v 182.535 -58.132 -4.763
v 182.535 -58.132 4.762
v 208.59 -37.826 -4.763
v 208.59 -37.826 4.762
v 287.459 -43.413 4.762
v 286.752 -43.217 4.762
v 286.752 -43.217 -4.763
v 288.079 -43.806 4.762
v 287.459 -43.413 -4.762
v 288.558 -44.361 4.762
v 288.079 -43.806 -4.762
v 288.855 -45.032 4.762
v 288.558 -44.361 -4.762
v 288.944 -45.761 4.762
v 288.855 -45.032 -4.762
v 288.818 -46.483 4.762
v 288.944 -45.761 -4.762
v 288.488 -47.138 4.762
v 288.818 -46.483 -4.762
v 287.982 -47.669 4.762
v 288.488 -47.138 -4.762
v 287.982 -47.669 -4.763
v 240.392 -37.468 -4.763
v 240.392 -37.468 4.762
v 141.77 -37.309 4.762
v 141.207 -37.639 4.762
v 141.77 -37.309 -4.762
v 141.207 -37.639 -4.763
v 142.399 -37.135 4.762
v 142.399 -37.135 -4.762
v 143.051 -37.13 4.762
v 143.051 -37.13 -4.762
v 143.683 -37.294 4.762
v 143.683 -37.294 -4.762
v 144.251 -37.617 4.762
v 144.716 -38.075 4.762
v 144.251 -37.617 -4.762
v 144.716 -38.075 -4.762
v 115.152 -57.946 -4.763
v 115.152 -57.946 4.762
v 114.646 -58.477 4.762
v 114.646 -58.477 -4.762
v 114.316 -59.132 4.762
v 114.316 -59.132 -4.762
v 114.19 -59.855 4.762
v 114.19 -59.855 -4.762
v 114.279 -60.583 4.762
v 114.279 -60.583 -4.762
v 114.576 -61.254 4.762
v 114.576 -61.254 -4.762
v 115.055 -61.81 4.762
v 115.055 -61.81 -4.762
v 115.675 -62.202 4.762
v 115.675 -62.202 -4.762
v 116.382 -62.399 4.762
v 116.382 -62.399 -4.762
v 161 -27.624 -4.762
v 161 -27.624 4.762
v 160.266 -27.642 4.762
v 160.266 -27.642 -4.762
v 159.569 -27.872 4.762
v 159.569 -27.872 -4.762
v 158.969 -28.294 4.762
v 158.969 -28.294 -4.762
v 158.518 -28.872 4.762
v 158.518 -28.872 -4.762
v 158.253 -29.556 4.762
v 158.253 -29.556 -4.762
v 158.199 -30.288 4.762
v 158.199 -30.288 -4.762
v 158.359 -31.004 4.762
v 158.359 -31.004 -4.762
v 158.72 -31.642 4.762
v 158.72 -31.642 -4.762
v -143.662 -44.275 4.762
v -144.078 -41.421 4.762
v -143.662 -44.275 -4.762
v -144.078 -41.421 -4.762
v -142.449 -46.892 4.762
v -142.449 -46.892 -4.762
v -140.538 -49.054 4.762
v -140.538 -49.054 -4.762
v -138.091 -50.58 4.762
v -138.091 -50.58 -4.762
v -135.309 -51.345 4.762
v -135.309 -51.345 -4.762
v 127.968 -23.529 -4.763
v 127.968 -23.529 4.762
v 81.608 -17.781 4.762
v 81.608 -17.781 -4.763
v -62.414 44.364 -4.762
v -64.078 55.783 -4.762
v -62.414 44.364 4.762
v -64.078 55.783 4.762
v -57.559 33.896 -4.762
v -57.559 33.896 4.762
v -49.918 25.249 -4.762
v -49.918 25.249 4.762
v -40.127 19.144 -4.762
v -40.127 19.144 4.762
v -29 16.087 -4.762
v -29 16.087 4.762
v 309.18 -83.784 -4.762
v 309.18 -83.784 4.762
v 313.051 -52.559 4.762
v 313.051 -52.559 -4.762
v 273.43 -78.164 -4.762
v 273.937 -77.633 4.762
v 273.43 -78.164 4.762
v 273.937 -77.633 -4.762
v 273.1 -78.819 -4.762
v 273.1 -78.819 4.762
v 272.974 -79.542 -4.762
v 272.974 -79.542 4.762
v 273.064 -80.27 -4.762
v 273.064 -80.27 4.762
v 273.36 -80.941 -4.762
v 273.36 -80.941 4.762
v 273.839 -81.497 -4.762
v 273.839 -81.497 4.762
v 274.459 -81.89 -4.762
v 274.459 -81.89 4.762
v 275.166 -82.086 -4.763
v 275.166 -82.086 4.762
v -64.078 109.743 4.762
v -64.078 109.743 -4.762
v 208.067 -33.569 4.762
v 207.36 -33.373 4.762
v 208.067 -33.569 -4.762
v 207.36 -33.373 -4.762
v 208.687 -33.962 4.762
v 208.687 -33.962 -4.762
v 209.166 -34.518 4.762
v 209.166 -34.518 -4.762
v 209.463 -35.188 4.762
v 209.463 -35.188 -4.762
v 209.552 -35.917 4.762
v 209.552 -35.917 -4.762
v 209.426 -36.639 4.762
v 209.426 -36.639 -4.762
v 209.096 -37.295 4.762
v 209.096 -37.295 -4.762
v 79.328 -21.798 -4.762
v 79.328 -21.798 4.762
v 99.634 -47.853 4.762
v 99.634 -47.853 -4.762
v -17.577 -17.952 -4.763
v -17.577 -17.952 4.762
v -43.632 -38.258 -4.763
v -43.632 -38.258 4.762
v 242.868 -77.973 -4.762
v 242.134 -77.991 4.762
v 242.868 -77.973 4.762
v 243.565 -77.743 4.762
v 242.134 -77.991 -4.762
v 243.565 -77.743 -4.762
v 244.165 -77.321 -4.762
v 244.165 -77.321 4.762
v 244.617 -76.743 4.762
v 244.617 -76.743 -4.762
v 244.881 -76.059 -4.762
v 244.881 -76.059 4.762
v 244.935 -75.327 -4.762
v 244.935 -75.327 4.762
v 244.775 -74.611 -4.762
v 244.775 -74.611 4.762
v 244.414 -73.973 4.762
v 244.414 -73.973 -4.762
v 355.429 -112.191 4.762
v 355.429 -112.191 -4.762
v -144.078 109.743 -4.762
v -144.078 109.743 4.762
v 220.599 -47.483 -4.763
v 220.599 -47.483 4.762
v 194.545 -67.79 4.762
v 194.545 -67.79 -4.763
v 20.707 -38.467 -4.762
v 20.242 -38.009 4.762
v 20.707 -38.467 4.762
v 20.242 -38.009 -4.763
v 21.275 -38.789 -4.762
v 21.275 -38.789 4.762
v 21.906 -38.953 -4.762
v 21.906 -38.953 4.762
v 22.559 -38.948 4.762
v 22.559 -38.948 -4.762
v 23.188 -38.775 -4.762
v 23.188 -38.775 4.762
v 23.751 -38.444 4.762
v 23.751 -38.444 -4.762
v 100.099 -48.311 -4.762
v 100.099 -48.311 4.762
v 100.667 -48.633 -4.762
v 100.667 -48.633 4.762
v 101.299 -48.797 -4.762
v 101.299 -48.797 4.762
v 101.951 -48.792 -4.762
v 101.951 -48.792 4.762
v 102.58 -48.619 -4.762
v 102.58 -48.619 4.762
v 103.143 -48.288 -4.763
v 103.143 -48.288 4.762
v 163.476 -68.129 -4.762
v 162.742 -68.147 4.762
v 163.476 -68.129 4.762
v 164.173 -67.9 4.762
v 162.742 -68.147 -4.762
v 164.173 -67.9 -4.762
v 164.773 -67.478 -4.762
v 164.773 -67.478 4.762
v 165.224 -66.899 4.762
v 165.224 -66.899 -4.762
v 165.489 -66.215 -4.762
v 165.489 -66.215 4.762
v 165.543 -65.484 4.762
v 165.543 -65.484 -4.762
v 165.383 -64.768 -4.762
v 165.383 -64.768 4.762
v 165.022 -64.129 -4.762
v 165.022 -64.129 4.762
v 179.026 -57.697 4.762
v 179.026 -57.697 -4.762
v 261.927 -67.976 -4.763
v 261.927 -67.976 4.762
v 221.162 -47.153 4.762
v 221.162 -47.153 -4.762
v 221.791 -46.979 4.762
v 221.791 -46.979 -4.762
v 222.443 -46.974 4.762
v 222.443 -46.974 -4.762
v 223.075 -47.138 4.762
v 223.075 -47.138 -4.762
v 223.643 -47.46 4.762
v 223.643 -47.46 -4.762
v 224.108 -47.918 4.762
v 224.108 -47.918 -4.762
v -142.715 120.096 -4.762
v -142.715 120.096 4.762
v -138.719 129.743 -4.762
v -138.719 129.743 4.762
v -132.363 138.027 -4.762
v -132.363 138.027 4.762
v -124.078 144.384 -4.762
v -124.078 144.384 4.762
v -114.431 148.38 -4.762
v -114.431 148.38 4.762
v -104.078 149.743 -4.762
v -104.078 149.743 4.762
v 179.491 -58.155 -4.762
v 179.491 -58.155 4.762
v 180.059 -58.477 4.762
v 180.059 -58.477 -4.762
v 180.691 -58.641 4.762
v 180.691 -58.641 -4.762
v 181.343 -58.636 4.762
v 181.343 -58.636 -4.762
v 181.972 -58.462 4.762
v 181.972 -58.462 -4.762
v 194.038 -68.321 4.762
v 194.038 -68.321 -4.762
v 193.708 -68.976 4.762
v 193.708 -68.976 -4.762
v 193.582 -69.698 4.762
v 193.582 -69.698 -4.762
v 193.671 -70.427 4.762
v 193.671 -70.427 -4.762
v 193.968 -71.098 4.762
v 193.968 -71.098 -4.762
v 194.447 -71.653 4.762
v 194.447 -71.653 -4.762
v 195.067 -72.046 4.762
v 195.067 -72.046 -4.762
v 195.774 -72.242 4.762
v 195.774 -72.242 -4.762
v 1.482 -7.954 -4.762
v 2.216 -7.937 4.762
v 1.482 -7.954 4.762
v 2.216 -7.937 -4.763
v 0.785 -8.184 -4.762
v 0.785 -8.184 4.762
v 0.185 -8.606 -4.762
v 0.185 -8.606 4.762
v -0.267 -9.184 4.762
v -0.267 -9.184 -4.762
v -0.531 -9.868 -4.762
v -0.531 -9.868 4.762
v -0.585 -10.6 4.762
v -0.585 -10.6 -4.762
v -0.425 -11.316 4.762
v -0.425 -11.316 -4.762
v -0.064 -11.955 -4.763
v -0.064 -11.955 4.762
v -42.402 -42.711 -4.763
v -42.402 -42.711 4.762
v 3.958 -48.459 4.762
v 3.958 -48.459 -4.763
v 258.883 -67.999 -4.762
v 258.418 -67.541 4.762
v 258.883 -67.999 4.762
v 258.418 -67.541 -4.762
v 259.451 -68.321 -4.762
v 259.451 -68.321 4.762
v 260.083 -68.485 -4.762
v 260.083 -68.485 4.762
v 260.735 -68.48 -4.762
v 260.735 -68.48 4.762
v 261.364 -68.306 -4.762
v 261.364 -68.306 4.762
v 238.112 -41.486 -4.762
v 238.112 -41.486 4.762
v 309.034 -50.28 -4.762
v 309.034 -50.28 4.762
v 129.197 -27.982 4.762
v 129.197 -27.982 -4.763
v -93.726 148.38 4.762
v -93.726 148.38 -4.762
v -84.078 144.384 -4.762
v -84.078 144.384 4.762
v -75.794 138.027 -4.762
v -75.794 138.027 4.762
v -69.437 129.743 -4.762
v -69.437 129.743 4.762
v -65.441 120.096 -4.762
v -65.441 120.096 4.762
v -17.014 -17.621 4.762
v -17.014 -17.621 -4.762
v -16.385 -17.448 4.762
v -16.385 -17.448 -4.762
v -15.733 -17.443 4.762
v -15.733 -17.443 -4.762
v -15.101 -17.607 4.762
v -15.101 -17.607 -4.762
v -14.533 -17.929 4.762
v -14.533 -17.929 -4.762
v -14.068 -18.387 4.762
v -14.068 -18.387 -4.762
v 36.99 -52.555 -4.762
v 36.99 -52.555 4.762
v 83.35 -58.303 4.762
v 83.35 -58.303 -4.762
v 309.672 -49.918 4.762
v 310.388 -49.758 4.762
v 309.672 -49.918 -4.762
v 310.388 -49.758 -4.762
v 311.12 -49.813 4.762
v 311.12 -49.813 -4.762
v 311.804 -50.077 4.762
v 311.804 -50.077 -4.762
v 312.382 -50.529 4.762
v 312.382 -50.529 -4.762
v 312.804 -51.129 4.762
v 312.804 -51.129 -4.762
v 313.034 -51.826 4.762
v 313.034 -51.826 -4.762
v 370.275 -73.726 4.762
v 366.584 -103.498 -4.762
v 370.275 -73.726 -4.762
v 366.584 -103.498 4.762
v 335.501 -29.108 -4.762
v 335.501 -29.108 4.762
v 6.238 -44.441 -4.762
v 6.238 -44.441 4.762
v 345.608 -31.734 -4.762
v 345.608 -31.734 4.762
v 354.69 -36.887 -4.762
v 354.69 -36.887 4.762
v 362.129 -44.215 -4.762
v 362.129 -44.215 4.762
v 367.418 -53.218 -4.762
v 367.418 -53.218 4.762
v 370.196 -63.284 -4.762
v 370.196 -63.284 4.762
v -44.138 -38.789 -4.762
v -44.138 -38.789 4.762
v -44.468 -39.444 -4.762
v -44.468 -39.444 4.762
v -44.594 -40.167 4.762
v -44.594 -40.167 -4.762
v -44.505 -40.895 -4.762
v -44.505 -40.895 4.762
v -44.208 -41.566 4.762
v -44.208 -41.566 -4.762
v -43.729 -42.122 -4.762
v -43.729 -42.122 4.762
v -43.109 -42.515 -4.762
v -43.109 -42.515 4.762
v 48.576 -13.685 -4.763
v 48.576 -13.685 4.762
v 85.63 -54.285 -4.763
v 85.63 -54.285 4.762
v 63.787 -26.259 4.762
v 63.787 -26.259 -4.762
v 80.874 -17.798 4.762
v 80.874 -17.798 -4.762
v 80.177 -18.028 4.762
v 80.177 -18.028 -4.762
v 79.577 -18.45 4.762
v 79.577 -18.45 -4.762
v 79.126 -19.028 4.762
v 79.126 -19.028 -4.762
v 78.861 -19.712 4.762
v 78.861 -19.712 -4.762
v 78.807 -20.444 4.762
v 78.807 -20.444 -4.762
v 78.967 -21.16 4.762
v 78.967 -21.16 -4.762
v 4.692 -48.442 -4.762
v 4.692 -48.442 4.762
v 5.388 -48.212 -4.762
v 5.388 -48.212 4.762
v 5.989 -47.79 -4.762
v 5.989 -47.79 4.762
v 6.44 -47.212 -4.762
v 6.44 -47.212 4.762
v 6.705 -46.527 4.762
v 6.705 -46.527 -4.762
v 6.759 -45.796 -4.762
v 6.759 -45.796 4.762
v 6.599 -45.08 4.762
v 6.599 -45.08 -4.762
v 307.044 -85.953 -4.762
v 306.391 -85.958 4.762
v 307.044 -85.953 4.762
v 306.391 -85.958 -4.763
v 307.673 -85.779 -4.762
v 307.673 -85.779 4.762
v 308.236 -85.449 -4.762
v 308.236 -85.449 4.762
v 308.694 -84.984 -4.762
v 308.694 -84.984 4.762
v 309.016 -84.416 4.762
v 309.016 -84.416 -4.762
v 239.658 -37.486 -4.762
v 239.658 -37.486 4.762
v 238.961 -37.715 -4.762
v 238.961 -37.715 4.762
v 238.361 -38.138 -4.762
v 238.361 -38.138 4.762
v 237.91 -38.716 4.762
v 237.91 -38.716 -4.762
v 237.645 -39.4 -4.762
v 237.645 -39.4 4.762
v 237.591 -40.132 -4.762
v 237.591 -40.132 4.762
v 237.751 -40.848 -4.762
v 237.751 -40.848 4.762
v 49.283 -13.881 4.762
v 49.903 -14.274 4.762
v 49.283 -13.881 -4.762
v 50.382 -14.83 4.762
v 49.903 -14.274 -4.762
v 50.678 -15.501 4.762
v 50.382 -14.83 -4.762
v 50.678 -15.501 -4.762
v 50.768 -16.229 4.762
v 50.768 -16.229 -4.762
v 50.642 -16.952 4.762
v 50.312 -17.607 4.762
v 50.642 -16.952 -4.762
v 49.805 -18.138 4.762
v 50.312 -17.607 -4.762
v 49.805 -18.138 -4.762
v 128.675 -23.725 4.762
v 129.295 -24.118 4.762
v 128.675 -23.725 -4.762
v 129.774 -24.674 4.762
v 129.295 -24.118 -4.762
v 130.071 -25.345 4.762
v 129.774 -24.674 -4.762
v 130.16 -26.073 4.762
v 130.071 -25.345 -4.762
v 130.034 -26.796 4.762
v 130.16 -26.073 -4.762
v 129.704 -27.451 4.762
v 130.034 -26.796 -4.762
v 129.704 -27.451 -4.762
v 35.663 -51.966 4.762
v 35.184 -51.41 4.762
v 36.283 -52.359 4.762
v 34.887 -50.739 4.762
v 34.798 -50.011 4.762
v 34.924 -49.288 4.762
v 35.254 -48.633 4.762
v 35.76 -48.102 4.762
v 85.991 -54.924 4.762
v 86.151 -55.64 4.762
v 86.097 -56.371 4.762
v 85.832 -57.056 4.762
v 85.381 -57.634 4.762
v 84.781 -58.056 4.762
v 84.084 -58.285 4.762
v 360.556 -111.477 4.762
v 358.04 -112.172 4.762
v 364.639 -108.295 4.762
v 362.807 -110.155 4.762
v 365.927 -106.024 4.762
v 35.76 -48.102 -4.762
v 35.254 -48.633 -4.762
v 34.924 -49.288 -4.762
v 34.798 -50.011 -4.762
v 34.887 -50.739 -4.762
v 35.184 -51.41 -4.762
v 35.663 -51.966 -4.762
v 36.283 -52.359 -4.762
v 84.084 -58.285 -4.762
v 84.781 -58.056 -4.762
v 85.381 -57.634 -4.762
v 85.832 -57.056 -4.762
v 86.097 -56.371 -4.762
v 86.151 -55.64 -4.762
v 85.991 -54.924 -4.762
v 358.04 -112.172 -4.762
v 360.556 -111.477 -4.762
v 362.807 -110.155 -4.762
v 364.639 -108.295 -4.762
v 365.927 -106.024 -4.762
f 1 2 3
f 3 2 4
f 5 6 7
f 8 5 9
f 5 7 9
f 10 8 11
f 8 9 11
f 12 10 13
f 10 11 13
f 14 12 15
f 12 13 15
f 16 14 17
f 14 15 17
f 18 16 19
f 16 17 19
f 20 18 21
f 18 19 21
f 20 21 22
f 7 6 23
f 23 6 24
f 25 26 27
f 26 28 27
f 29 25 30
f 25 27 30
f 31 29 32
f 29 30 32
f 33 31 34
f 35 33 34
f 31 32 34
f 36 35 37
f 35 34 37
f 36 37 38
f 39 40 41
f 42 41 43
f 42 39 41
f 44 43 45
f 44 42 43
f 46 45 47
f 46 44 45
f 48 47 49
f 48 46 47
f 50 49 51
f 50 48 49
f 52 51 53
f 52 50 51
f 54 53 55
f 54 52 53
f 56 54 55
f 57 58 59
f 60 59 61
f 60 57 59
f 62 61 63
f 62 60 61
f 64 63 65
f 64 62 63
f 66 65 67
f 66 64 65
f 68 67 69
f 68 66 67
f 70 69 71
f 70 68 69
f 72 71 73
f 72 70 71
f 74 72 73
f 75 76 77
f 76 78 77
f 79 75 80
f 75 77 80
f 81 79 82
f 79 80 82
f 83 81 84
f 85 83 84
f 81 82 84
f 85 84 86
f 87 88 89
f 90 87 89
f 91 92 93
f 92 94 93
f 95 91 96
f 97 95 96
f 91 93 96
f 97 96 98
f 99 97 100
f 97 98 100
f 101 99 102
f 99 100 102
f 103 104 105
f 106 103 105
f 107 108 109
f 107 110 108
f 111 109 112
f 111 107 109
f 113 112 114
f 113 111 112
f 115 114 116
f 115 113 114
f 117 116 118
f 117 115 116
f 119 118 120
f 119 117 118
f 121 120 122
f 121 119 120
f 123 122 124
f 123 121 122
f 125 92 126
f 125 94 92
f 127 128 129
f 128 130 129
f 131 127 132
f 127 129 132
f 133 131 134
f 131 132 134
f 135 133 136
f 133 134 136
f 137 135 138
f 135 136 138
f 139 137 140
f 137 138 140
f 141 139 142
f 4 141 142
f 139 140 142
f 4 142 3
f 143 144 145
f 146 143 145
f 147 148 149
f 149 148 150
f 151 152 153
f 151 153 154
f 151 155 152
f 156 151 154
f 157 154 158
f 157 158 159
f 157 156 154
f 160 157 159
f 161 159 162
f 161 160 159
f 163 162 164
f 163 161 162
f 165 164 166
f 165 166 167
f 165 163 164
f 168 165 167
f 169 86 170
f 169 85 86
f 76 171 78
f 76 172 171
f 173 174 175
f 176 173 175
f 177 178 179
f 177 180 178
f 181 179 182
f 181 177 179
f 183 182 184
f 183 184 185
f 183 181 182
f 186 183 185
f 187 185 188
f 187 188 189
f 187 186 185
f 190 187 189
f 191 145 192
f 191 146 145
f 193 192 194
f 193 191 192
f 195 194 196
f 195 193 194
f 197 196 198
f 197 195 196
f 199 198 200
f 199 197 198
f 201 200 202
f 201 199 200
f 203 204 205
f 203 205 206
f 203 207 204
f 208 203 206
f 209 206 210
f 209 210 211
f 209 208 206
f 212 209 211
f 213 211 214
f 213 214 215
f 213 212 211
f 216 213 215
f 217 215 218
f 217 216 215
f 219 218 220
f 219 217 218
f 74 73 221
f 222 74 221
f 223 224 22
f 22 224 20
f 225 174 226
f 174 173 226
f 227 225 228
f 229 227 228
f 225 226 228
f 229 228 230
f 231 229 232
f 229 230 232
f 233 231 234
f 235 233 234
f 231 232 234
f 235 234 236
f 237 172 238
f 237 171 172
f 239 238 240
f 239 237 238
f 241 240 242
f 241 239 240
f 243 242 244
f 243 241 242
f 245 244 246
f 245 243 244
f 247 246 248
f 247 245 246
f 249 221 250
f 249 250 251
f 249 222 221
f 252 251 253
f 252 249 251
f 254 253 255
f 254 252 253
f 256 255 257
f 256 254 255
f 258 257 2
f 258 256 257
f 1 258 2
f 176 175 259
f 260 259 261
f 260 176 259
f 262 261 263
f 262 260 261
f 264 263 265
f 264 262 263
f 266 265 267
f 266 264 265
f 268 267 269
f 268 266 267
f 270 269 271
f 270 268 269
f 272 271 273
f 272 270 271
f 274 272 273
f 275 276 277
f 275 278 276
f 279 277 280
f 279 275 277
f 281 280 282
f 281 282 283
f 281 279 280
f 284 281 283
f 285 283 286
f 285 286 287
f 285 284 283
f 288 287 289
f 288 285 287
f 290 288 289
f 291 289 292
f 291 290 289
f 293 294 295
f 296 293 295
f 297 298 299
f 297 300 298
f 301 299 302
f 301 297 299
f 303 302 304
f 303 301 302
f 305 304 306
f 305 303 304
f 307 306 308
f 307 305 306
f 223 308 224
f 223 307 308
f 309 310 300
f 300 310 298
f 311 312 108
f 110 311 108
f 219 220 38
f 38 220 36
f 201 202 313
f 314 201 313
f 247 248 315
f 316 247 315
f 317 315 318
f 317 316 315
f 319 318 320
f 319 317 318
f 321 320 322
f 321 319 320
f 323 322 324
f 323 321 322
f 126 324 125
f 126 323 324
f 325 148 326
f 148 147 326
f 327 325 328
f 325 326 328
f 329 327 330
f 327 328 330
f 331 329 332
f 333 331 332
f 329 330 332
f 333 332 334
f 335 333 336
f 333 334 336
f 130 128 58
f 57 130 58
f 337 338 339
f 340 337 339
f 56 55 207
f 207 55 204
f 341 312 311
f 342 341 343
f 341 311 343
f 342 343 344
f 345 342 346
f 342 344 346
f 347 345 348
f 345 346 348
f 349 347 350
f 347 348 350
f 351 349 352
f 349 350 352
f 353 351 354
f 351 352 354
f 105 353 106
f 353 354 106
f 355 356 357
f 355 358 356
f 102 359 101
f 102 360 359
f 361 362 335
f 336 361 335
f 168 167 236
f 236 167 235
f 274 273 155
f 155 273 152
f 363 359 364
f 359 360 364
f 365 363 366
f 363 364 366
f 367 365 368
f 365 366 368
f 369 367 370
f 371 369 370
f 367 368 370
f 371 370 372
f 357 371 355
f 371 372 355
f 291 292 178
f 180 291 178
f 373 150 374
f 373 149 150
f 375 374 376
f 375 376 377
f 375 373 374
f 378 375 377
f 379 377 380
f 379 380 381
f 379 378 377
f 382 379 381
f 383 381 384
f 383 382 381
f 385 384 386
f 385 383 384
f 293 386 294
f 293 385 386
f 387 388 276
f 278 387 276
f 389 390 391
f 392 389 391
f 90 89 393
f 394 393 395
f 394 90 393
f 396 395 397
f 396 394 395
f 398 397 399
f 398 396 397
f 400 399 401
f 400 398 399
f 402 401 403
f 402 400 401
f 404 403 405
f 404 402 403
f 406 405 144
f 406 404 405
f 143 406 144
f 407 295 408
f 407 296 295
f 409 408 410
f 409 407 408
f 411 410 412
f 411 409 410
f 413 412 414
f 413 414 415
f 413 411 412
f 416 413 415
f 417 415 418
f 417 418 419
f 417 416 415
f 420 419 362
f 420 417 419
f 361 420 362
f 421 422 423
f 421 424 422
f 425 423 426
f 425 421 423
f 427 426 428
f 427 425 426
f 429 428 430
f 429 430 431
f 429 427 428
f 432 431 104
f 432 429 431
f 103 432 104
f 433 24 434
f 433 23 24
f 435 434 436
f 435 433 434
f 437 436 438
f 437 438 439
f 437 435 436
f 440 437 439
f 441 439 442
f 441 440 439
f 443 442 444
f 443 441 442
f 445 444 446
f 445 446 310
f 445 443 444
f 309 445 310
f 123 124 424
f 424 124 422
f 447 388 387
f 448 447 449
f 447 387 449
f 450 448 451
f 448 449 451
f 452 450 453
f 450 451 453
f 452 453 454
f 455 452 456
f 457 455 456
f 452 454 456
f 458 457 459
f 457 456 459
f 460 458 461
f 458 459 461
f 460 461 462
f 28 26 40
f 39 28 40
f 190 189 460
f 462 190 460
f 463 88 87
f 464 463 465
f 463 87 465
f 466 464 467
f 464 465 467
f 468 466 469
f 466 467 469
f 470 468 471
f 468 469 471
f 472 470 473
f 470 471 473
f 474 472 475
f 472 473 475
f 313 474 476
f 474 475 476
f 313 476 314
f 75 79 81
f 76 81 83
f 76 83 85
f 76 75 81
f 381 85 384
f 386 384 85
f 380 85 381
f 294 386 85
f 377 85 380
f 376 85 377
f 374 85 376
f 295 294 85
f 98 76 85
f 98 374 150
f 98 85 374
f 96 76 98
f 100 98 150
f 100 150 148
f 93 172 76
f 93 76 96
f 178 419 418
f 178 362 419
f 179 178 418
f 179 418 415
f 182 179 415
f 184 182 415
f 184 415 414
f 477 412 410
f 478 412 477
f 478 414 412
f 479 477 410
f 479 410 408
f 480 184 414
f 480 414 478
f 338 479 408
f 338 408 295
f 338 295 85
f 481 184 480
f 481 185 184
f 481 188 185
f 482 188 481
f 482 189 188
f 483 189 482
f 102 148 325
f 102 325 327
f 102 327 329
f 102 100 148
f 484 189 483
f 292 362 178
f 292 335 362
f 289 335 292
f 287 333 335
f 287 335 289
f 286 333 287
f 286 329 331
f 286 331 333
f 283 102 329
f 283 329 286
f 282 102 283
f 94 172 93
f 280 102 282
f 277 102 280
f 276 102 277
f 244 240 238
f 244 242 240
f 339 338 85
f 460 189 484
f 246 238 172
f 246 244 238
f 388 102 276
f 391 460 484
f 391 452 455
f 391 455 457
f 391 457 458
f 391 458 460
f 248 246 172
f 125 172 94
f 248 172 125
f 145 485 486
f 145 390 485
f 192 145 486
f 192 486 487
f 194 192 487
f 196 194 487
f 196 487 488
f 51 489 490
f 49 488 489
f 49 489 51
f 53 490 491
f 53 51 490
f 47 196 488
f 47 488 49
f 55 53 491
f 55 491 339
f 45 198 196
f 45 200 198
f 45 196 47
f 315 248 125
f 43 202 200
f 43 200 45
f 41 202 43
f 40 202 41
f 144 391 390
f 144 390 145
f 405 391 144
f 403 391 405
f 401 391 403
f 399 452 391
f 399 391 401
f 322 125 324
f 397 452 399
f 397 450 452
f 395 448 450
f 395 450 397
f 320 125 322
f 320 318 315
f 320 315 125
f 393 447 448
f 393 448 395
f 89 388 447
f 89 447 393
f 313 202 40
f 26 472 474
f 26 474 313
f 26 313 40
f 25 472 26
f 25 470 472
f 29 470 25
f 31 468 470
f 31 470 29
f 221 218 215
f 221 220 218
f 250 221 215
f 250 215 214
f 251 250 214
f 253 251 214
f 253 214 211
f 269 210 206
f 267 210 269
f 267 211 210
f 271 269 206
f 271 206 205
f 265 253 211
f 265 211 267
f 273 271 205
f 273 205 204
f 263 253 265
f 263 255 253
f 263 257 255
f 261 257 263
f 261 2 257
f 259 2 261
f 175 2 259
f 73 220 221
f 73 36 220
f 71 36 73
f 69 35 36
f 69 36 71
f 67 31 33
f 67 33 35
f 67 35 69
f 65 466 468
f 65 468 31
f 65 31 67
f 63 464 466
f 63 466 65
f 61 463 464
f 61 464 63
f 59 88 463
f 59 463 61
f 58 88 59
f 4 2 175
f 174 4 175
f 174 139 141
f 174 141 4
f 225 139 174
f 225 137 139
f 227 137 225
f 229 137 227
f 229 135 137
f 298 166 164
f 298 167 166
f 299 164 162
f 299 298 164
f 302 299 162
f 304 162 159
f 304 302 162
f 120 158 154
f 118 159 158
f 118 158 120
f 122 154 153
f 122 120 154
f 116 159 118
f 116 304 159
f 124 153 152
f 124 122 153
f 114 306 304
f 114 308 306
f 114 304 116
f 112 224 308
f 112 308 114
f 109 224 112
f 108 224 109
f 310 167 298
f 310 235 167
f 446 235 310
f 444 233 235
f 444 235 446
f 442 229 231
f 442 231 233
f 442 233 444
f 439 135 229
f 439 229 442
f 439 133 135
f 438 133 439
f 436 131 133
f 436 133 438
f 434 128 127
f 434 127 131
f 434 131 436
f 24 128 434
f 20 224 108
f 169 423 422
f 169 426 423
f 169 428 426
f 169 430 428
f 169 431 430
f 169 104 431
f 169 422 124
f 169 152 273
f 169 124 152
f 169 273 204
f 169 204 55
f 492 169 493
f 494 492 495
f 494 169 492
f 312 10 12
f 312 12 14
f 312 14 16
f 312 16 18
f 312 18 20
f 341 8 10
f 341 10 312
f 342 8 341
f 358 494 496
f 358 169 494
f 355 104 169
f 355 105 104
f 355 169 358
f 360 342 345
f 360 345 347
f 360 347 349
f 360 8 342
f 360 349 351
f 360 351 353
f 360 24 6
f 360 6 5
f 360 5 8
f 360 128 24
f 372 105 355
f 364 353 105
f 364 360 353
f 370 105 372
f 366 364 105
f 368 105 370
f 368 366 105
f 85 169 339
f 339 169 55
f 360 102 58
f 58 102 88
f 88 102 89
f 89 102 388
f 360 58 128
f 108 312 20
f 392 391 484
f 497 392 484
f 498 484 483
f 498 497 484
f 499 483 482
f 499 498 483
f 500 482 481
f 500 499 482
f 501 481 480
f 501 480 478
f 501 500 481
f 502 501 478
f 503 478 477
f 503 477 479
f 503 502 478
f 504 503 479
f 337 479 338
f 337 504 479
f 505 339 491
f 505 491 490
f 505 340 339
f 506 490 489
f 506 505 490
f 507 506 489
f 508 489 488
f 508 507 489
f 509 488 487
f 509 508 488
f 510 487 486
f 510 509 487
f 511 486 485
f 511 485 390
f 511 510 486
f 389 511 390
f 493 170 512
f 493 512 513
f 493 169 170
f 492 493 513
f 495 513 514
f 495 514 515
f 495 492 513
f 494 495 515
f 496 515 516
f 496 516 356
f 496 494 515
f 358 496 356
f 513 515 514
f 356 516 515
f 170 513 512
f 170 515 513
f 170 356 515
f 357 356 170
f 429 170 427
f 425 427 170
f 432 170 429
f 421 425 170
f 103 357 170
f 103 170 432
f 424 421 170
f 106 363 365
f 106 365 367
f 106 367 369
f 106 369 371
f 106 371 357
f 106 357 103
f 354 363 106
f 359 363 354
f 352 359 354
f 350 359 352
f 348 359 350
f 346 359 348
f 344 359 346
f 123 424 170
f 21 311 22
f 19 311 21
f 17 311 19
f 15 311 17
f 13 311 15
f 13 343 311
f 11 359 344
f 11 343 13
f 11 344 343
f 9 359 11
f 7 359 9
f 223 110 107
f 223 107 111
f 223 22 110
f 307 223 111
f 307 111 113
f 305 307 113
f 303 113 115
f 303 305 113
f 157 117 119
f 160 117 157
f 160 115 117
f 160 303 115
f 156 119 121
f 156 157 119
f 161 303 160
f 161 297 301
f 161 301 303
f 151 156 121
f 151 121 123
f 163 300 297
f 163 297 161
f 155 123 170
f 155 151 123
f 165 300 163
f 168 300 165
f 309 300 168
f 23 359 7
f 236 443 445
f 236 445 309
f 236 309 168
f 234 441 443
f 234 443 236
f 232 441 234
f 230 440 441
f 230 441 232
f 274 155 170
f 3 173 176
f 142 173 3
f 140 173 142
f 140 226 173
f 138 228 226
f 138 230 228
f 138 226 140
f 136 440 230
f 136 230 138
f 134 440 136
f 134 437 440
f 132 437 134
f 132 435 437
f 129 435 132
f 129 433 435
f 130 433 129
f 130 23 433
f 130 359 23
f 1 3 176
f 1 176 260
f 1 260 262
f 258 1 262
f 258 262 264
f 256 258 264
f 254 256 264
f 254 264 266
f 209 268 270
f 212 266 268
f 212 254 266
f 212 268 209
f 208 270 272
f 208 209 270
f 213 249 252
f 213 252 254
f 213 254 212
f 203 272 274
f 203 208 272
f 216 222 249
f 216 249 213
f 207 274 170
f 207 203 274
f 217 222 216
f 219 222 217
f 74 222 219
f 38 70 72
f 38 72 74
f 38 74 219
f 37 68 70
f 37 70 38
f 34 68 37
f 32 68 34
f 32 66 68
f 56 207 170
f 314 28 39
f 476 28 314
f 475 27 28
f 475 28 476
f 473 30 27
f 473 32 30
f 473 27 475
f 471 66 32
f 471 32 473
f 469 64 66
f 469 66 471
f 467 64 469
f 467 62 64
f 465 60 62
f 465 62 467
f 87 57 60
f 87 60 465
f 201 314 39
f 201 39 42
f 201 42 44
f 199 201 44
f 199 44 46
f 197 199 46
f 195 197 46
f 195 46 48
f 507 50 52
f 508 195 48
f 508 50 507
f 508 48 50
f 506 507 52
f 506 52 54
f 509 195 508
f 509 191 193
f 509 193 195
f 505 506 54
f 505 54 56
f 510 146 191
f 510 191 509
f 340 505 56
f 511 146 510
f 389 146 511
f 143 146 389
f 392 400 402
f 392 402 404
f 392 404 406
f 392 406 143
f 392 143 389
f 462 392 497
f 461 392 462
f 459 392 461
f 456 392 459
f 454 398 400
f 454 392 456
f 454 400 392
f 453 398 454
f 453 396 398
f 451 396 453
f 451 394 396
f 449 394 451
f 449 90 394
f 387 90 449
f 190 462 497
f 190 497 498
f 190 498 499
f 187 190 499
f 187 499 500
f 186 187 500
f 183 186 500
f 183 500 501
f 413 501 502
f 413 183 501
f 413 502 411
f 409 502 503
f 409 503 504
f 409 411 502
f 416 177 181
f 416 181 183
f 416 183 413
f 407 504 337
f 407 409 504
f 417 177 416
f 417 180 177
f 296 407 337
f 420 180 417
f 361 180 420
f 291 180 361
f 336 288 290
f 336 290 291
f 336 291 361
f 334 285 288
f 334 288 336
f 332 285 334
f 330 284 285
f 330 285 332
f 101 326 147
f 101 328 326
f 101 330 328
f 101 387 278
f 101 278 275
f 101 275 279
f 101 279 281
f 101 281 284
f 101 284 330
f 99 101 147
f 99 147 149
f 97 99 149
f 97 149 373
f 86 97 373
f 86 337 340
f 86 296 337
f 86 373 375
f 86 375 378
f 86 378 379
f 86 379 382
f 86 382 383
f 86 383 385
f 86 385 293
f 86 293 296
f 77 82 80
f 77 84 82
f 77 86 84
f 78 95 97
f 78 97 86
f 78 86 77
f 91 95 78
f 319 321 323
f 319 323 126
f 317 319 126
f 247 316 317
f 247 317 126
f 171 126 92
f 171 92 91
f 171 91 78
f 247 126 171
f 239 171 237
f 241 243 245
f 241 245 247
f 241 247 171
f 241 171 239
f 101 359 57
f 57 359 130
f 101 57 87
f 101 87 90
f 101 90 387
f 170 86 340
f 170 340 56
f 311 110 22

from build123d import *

# Parameters (mm, degrees)
SKETCH1_R           = 7.9375
SKETCH1_R_2         = 4.7879
BOSS_EXTRUDE1_DEPTH = 4.7625
FILLET3_R           = 40
FILLET4_R           = 10
CUT_EXTRUDE1_DEPTH  = 10
FILLET5_R           = 2.5
SKETCH30_R          = 7.9375
SKETCH30_R_2        = 4.7879
BOSS_EXTRUDE2_DEPTH = 9.525


with BuildPart() as part:
    # Sketch1 → Boss-Extrude1 (new, symmetric)
    with BuildSketch(Plane.XY):
        Polygon((-144.07836487, 49.742763384), (-144.07836487, -50.257236616), (365.353249064, -113.421723532), (375.197079951, -34.029664776), (-64.07836487, 20.436150317), (-64.07836487, 149.742763384), (-144.07836487, 149.742763384), align=None)
        with Locations(Location((-104.07836487, 109.742763384, 0), (0, 0, 180))):
            Circle(SKETCH1_R, mode=Mode.SUBTRACT)
        with Locations(Location((330.57913513, -68.80377871, 0), (0, 0, 180))):
            Circle(SKETCH1_R_2, mode=Mode.SUBTRACT)
    extrude(amount=BOSS_EXTRUDE1_DEPTH, both=True)

    # Fillet3
    fillet3_edges = [part.edges().sort_by_distance(p)[0] for p in [
        (-64.07836487, 20.436150317, 0),
        (-64.07836487, 149.742763384, 0),
        (-144.07836487, 149.742763384, 0),
        (375.197079951, -34.029664776, 0),
    ]]
    fillet(fillet3_edges, radius=FILLET3_R - 0.0001)  # a hair under: the kernel refuses the full size

    # Fillet4
    fillet4_edges = [part.edges().sort_by_distance(p)[0] for p in [
        (365.353249064, -113.421723532, 0),
        (-144.07836487, -50.257236616, 0),
    ]]
    fillet(fillet4_edges, radius=FILLET4_R)

    # Sketch16 → Cut-Extrude1 (cut)
    with BuildSketch(Plane.XY.offset(4.7625)):
        Polygon((54.565895217, -14.427714854), (-3.774164869, -7.194123807), (21.77906965, -39.980949374), align=None)
        Polygon((-15.605284124, -16.415003221), (-48.392109691, -41.968237741), (9.947950395, -49.201828788), align=None)
        Polygon((133.957953972, -24.271545742), (75.617893886, -17.037954695), (101.171128405, -49.824780261), align=None)
        Polygon((63.786774631, -26.258834109), (30.999949065, -51.812068628), (89.340009151, -59.045659676), align=None)
        Polygon((213.350012728, -34.11537663), (155.009952642, -26.881785582), (180.563187161, -59.668611149), align=None)
        Polygon((143.178833387, -36.102664997), (110.39200782, -61.655899516), (168.732067906, -68.889490564), align=None)
        Polygon((292.742071484, -43.959207518), (234.402011397, -36.72561647), (259.955245917, -69.512442037), align=None)
        Polygon((222.570892143, -45.946495885), (189.784066576, -71.499730404), (248.124126662, -78.733321452), align=None)
        Polygon((313.794070153, -46.569447358), (269.176125331, -81.343561292), (308.872154709, -86.265476736), align=None)
    extrude(amount=-CUT_EXTRUDE1_DEPTH, mode=Mode.SUBTRACT)

    # Fillet5
    fillet5_edges = [part.edges().sort_by_distance(p)[0] for p in [
        (110.39200782, -61.655899516, 0),
        (143.178833387, -36.102664997, 0),
        (168.732067906, -68.889490564, 0),
        (292.742071484, -43.959207518, 0),
        (259.955245917, -69.512442037, 0),
        (234.402011397, -36.72561647, 0),
        (189.784066576, -71.499730404, 0),
        (222.570892143, -45.946495885, 0),
        (248.124126662, -78.733321452, 0),
        (-48.392109691, -41.968237741, 0),
        (-15.605284124, -16.415003221, 0),
        (9.947950395, -49.201828788, 0),
        (30.999949065, -51.812068628, 0),
        (89.340009151, -59.045659676, 0),
        (54.565895217, -14.427714854, 0),
        (21.77906965, -39.980949374, 0),
        (-3.774164869, -7.194123807, 0),
        (133.957953972, -24.271545742, 0),
        (101.171128405, -49.824780261, 0),
        (75.617893886, -17.037954695, 0),
        (269.176125331, -81.343561292, 0),
        (313.794070153, -46.569447358, 0),
        (308.872154709, -86.265476736, 0),
        (213.350012728, -34.11537663, 0),
        (180.563187161, -59.668611149, 0),
        (155.009952642, -26.881785582, 0),
    ]]
    fillet(fillet5_edges, radius=FILLET5_R)

    # Sketch30 → Boss-Extrude2 (add)
    with BuildSketch(Plane(origin=(0, 0, -4.7625), x_dir=(-1, 0, 0), z_dir=(0, 0, -1))):
        with Locations((104.07836487, 109.742763384)):
            Circle(SKETCH30_R)
        with Locations((-330.57913513, -68.80377871)):
            Circle(SKETCH30_R_2)
    extrude(amount=-BOSS_EXTRUDE2_DEPTH)


solid = part.part
